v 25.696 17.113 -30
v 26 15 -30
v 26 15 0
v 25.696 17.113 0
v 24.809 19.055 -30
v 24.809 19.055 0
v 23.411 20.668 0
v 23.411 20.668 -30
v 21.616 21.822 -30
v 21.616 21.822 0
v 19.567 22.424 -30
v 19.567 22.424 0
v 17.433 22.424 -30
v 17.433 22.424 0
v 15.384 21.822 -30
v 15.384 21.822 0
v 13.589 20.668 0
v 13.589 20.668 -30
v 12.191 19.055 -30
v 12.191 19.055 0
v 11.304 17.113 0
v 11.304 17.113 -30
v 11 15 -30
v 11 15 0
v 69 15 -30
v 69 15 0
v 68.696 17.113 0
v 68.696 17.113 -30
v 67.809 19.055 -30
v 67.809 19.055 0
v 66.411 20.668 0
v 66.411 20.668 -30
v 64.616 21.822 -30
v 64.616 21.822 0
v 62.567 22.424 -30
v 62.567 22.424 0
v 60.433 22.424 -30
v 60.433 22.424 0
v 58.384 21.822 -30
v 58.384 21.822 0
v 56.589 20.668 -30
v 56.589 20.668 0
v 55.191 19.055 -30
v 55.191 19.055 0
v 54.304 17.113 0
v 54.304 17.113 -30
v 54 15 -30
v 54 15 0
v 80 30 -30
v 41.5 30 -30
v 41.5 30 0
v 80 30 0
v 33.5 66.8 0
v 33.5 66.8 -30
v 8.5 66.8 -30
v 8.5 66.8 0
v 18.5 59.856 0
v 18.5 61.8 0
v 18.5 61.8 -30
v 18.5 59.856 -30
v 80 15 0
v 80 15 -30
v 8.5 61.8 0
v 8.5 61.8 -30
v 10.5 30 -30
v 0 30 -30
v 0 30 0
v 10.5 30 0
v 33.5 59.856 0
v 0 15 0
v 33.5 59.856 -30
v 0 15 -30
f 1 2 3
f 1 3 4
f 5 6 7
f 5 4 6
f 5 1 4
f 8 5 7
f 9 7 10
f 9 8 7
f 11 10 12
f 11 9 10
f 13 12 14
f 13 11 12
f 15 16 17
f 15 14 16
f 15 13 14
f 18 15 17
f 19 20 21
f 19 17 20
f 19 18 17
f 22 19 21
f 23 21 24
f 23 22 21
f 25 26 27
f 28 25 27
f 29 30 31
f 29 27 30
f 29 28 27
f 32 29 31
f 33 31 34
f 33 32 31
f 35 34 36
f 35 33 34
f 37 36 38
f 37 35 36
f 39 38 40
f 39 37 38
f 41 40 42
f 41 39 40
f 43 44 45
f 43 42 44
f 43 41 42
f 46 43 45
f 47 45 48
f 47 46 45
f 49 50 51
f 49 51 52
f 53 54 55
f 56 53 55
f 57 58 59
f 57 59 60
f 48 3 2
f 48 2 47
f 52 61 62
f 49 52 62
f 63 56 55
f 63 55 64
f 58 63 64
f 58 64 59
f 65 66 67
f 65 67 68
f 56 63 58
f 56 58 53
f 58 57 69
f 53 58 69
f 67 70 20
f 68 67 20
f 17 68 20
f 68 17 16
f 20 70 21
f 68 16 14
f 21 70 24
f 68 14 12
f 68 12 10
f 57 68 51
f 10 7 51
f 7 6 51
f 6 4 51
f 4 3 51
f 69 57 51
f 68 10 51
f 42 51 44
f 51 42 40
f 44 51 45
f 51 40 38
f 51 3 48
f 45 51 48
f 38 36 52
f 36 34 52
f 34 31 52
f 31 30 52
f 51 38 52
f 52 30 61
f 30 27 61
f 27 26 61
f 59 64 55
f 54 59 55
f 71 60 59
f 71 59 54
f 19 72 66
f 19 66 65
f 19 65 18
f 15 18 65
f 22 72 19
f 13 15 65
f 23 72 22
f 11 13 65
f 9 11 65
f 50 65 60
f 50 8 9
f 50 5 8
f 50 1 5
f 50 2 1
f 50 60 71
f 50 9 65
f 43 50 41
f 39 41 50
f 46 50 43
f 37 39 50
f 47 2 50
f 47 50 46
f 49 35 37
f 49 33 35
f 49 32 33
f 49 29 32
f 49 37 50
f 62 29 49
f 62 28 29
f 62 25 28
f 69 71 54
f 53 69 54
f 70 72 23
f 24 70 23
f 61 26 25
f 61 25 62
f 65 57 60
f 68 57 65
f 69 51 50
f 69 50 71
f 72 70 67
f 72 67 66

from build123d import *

# Parameters (mm, degrees)
SKETCH1_W               = 80
SKETCH1_H               = 30
BOSS_EXTRUDE1_DEPTH     = 30
CUT_EXTRUDE1_DEPTH      = 91.553851381
CUT_EXTRUDE1_DEPTH_BACK = 91.553851381
SKETCH2_R               = 7.5
BOSS_EXTRUDE2_DEPTH     = 30
CUT_EXTRUDE2_DEPTH      = 109.453861158
CUT_EXTRUDE2_DEPTH_BACK = 109.453861158
SKETCH4_W               = 102.556598927
SKETCH4_H               = 19.243482925


with BuildPart() as part:
    # Sketch1 → Boss-Extrude1 (new body)
    with BuildSketch(Plane(origin=(0, 0, 0), x_dir=(1, 0, 0), z_dir=(0, 1, 0))):
        with Locations((40, 15)):
            Rectangle(SKETCH1_W, SKETCH1_H)
    extrude(amount=BOSS_EXTRUDE1_DEPTH)

    # Sketch2 → Cut-Extrude1 (cut, two sides: drawn at the far end of the back side and taken through both)
    with BuildSketch(Plane.XY.offset(-CUT_EXTRUDE1_DEPTH_BACK)):
        with Locations((61.5, 15)):
            Circle(SKETCH2_R)
        with Locations(Location((18.5, 15, 0), (0, 0, 180))):
            Circle(SKETCH2_R)
    extrude(amount=CUT_EXTRUDE1_DEPTH + CUT_EXTRUDE1_DEPTH_BACK, mode=Mode.SUBTRACT)

    # Sketch3 → Boss-Extrude2 (add)
    with BuildSketch(Plane.XY):
        Polygon((18.5, 30), (18.5, 59.856406461), (10.5, 30), align=None)
        Polygon((8.5, 66.8), (8.5, 61.8), (18.5, 61.8), (18.5, 59.856406461), (18.5, 30), (41.5, 30), (33.5, 59.856406461), (33.5, 66.8), align=None)
    extrude(amount=-BOSS_EXTRUDE2_DEPTH)

    # Sketch4 → Cut-Extrude2 (cut, two sides: drawn at the far end of the back side and taken through both)
    with BuildSketch(Plane.XY.offset(-CUT_EXTRUDE2_DEPTH_BACK)):
        with Locations((41.179129622, 5.378258538)):
            Rectangle(SKETCH4_W, SKETCH4_H)
    extrude(amount=CUT_EXTRUDE2_DEPTH + CUT_EXTRUDE2_DEPTH_BACK, mode=Mode.SUBTRACT)


solid = part.part
